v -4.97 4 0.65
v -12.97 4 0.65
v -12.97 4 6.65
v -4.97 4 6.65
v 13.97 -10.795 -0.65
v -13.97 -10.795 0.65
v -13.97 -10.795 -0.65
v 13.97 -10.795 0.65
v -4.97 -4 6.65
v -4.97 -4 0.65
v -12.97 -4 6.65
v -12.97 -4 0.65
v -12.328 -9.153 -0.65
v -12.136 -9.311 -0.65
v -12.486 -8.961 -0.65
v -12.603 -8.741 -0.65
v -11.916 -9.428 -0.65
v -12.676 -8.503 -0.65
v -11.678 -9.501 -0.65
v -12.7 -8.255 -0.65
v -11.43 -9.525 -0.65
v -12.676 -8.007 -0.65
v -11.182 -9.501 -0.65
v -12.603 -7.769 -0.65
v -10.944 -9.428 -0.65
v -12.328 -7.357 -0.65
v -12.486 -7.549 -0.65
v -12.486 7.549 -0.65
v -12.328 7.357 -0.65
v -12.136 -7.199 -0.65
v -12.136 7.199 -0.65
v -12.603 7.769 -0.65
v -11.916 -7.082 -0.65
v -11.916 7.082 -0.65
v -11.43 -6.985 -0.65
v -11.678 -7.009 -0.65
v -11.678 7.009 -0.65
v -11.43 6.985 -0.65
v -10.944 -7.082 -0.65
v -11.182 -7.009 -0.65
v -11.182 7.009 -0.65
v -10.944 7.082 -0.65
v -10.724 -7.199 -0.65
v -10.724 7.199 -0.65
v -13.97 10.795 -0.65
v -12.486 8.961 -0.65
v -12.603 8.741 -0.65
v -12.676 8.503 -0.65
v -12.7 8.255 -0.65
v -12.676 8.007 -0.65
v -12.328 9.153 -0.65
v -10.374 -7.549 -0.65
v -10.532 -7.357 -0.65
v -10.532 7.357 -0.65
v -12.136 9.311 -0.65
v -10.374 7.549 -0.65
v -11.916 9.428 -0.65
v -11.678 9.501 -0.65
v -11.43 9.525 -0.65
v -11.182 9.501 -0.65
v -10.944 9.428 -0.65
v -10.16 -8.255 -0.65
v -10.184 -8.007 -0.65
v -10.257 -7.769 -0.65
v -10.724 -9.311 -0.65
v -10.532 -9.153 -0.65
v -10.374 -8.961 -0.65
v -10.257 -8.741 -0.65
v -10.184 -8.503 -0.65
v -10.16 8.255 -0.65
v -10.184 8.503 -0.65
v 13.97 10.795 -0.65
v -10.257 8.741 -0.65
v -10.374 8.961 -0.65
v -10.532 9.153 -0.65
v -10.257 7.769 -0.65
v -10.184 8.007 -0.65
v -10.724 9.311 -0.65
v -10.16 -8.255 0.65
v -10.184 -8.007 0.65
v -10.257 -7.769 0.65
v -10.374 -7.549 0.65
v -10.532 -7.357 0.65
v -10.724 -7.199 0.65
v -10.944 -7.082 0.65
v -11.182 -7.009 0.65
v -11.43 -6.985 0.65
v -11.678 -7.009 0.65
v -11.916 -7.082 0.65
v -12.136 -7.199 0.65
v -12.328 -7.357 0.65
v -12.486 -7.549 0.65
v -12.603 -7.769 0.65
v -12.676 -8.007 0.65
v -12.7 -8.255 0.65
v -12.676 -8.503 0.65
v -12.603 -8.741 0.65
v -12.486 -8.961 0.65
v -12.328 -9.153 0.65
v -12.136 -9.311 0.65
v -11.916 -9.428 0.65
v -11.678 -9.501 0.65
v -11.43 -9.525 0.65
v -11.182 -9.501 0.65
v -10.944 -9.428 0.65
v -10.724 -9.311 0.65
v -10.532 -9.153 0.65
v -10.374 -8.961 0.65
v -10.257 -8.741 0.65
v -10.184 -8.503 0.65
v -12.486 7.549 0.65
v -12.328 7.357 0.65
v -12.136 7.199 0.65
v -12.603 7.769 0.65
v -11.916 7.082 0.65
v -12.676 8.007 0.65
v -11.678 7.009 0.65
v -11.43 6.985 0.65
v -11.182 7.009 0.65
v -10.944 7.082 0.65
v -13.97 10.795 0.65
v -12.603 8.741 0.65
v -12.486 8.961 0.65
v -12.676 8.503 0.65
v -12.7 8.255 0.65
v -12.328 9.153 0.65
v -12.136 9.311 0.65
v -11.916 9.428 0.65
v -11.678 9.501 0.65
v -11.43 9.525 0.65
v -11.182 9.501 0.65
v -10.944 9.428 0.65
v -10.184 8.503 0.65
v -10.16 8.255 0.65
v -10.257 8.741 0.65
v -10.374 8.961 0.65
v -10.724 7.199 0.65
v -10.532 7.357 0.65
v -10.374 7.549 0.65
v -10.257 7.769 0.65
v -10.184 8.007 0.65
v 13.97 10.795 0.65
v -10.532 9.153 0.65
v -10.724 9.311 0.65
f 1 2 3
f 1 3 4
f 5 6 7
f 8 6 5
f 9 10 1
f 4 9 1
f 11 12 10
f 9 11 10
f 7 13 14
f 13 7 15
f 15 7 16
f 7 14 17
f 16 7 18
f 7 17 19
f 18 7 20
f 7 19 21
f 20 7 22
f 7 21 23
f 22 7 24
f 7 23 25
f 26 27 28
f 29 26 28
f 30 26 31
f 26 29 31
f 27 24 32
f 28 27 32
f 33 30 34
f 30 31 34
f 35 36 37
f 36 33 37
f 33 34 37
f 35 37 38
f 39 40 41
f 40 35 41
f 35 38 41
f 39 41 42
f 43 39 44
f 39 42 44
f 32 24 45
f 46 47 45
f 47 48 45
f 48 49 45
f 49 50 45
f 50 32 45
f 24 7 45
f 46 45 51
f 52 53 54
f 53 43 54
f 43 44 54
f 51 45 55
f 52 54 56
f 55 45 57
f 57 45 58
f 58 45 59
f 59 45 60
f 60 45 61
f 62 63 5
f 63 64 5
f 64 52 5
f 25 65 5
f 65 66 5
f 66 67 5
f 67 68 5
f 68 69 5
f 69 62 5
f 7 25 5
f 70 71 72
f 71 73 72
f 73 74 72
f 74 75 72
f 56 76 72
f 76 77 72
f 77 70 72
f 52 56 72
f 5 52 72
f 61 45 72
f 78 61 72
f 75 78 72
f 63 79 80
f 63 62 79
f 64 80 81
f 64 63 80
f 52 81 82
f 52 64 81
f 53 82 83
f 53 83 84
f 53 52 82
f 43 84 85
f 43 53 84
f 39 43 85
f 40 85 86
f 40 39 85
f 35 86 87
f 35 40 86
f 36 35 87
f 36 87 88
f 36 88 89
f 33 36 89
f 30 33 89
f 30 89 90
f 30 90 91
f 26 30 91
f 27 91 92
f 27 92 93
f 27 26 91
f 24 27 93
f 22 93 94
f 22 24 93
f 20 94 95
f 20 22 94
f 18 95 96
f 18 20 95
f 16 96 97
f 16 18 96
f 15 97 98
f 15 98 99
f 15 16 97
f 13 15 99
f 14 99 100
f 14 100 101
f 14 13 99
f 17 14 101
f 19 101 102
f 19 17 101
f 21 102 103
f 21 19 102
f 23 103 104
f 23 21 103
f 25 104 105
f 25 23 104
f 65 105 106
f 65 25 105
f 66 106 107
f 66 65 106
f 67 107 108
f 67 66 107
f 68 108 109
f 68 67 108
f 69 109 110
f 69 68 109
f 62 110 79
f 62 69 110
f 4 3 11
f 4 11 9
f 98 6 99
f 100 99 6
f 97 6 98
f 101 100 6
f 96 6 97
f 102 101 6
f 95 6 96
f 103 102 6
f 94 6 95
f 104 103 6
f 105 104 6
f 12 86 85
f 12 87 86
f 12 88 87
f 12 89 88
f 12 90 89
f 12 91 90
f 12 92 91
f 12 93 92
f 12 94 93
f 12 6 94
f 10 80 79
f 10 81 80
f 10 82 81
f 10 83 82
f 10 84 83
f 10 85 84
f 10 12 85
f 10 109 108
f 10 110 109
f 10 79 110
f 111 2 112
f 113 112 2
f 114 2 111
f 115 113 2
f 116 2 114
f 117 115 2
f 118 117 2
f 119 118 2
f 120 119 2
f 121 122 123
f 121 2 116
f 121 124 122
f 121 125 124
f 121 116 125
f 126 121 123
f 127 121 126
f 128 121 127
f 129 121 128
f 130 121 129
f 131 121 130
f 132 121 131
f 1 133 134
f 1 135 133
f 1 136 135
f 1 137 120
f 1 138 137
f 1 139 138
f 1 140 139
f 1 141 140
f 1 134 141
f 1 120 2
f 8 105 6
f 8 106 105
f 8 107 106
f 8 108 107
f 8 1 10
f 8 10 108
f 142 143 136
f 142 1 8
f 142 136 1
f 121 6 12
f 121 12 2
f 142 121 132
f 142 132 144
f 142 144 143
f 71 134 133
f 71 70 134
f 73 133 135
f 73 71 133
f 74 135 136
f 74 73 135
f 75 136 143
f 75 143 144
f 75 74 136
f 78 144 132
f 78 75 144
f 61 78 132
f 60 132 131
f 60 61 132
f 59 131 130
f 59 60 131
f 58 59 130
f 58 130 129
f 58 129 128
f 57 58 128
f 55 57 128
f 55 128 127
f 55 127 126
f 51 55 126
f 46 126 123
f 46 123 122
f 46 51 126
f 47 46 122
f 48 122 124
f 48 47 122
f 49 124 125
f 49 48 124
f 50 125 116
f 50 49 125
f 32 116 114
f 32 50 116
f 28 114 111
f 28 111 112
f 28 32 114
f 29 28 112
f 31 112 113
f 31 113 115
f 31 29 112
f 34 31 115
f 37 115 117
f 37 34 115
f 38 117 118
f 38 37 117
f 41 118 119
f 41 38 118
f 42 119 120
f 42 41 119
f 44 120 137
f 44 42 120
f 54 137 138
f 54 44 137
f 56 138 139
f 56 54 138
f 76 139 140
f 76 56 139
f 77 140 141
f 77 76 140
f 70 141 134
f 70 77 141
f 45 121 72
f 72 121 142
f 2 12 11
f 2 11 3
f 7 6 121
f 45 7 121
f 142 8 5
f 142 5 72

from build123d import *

# Parameters (mm, degrees)
F0_W     = 27.94
F0_H     = 21.59
F0_R     = 1.27
F1_DEPTH = 0.65
F2_W     = 8
F2_H     = 8
F3_DEPTH = 6


with BuildPart() as f1:
    # F0 (on Top) → F1 (new body, symmetric)
    with BuildSketch(Plane.XY):
        Rectangle(F0_W, F0_H)
        with Locations((-11.43, -8.255)):
            Circle(F0_R, mode=Mode.SUBTRACT)
        with Locations((-11.43, 8.255)):
            Circle(F0_R, mode=Mode.SUBTRACT)
    extrude(amount=F1_DEPTH, both=True)

    # F2 (on face) → F3 (join)
    with BuildSketch(Plane.XY.offset(0.65)):
        with Locations((-8.97, 0)):
            Rectangle(F2_W, F2_H)
    extrude(amount=F3_DEPTH)


solid = f1.part
